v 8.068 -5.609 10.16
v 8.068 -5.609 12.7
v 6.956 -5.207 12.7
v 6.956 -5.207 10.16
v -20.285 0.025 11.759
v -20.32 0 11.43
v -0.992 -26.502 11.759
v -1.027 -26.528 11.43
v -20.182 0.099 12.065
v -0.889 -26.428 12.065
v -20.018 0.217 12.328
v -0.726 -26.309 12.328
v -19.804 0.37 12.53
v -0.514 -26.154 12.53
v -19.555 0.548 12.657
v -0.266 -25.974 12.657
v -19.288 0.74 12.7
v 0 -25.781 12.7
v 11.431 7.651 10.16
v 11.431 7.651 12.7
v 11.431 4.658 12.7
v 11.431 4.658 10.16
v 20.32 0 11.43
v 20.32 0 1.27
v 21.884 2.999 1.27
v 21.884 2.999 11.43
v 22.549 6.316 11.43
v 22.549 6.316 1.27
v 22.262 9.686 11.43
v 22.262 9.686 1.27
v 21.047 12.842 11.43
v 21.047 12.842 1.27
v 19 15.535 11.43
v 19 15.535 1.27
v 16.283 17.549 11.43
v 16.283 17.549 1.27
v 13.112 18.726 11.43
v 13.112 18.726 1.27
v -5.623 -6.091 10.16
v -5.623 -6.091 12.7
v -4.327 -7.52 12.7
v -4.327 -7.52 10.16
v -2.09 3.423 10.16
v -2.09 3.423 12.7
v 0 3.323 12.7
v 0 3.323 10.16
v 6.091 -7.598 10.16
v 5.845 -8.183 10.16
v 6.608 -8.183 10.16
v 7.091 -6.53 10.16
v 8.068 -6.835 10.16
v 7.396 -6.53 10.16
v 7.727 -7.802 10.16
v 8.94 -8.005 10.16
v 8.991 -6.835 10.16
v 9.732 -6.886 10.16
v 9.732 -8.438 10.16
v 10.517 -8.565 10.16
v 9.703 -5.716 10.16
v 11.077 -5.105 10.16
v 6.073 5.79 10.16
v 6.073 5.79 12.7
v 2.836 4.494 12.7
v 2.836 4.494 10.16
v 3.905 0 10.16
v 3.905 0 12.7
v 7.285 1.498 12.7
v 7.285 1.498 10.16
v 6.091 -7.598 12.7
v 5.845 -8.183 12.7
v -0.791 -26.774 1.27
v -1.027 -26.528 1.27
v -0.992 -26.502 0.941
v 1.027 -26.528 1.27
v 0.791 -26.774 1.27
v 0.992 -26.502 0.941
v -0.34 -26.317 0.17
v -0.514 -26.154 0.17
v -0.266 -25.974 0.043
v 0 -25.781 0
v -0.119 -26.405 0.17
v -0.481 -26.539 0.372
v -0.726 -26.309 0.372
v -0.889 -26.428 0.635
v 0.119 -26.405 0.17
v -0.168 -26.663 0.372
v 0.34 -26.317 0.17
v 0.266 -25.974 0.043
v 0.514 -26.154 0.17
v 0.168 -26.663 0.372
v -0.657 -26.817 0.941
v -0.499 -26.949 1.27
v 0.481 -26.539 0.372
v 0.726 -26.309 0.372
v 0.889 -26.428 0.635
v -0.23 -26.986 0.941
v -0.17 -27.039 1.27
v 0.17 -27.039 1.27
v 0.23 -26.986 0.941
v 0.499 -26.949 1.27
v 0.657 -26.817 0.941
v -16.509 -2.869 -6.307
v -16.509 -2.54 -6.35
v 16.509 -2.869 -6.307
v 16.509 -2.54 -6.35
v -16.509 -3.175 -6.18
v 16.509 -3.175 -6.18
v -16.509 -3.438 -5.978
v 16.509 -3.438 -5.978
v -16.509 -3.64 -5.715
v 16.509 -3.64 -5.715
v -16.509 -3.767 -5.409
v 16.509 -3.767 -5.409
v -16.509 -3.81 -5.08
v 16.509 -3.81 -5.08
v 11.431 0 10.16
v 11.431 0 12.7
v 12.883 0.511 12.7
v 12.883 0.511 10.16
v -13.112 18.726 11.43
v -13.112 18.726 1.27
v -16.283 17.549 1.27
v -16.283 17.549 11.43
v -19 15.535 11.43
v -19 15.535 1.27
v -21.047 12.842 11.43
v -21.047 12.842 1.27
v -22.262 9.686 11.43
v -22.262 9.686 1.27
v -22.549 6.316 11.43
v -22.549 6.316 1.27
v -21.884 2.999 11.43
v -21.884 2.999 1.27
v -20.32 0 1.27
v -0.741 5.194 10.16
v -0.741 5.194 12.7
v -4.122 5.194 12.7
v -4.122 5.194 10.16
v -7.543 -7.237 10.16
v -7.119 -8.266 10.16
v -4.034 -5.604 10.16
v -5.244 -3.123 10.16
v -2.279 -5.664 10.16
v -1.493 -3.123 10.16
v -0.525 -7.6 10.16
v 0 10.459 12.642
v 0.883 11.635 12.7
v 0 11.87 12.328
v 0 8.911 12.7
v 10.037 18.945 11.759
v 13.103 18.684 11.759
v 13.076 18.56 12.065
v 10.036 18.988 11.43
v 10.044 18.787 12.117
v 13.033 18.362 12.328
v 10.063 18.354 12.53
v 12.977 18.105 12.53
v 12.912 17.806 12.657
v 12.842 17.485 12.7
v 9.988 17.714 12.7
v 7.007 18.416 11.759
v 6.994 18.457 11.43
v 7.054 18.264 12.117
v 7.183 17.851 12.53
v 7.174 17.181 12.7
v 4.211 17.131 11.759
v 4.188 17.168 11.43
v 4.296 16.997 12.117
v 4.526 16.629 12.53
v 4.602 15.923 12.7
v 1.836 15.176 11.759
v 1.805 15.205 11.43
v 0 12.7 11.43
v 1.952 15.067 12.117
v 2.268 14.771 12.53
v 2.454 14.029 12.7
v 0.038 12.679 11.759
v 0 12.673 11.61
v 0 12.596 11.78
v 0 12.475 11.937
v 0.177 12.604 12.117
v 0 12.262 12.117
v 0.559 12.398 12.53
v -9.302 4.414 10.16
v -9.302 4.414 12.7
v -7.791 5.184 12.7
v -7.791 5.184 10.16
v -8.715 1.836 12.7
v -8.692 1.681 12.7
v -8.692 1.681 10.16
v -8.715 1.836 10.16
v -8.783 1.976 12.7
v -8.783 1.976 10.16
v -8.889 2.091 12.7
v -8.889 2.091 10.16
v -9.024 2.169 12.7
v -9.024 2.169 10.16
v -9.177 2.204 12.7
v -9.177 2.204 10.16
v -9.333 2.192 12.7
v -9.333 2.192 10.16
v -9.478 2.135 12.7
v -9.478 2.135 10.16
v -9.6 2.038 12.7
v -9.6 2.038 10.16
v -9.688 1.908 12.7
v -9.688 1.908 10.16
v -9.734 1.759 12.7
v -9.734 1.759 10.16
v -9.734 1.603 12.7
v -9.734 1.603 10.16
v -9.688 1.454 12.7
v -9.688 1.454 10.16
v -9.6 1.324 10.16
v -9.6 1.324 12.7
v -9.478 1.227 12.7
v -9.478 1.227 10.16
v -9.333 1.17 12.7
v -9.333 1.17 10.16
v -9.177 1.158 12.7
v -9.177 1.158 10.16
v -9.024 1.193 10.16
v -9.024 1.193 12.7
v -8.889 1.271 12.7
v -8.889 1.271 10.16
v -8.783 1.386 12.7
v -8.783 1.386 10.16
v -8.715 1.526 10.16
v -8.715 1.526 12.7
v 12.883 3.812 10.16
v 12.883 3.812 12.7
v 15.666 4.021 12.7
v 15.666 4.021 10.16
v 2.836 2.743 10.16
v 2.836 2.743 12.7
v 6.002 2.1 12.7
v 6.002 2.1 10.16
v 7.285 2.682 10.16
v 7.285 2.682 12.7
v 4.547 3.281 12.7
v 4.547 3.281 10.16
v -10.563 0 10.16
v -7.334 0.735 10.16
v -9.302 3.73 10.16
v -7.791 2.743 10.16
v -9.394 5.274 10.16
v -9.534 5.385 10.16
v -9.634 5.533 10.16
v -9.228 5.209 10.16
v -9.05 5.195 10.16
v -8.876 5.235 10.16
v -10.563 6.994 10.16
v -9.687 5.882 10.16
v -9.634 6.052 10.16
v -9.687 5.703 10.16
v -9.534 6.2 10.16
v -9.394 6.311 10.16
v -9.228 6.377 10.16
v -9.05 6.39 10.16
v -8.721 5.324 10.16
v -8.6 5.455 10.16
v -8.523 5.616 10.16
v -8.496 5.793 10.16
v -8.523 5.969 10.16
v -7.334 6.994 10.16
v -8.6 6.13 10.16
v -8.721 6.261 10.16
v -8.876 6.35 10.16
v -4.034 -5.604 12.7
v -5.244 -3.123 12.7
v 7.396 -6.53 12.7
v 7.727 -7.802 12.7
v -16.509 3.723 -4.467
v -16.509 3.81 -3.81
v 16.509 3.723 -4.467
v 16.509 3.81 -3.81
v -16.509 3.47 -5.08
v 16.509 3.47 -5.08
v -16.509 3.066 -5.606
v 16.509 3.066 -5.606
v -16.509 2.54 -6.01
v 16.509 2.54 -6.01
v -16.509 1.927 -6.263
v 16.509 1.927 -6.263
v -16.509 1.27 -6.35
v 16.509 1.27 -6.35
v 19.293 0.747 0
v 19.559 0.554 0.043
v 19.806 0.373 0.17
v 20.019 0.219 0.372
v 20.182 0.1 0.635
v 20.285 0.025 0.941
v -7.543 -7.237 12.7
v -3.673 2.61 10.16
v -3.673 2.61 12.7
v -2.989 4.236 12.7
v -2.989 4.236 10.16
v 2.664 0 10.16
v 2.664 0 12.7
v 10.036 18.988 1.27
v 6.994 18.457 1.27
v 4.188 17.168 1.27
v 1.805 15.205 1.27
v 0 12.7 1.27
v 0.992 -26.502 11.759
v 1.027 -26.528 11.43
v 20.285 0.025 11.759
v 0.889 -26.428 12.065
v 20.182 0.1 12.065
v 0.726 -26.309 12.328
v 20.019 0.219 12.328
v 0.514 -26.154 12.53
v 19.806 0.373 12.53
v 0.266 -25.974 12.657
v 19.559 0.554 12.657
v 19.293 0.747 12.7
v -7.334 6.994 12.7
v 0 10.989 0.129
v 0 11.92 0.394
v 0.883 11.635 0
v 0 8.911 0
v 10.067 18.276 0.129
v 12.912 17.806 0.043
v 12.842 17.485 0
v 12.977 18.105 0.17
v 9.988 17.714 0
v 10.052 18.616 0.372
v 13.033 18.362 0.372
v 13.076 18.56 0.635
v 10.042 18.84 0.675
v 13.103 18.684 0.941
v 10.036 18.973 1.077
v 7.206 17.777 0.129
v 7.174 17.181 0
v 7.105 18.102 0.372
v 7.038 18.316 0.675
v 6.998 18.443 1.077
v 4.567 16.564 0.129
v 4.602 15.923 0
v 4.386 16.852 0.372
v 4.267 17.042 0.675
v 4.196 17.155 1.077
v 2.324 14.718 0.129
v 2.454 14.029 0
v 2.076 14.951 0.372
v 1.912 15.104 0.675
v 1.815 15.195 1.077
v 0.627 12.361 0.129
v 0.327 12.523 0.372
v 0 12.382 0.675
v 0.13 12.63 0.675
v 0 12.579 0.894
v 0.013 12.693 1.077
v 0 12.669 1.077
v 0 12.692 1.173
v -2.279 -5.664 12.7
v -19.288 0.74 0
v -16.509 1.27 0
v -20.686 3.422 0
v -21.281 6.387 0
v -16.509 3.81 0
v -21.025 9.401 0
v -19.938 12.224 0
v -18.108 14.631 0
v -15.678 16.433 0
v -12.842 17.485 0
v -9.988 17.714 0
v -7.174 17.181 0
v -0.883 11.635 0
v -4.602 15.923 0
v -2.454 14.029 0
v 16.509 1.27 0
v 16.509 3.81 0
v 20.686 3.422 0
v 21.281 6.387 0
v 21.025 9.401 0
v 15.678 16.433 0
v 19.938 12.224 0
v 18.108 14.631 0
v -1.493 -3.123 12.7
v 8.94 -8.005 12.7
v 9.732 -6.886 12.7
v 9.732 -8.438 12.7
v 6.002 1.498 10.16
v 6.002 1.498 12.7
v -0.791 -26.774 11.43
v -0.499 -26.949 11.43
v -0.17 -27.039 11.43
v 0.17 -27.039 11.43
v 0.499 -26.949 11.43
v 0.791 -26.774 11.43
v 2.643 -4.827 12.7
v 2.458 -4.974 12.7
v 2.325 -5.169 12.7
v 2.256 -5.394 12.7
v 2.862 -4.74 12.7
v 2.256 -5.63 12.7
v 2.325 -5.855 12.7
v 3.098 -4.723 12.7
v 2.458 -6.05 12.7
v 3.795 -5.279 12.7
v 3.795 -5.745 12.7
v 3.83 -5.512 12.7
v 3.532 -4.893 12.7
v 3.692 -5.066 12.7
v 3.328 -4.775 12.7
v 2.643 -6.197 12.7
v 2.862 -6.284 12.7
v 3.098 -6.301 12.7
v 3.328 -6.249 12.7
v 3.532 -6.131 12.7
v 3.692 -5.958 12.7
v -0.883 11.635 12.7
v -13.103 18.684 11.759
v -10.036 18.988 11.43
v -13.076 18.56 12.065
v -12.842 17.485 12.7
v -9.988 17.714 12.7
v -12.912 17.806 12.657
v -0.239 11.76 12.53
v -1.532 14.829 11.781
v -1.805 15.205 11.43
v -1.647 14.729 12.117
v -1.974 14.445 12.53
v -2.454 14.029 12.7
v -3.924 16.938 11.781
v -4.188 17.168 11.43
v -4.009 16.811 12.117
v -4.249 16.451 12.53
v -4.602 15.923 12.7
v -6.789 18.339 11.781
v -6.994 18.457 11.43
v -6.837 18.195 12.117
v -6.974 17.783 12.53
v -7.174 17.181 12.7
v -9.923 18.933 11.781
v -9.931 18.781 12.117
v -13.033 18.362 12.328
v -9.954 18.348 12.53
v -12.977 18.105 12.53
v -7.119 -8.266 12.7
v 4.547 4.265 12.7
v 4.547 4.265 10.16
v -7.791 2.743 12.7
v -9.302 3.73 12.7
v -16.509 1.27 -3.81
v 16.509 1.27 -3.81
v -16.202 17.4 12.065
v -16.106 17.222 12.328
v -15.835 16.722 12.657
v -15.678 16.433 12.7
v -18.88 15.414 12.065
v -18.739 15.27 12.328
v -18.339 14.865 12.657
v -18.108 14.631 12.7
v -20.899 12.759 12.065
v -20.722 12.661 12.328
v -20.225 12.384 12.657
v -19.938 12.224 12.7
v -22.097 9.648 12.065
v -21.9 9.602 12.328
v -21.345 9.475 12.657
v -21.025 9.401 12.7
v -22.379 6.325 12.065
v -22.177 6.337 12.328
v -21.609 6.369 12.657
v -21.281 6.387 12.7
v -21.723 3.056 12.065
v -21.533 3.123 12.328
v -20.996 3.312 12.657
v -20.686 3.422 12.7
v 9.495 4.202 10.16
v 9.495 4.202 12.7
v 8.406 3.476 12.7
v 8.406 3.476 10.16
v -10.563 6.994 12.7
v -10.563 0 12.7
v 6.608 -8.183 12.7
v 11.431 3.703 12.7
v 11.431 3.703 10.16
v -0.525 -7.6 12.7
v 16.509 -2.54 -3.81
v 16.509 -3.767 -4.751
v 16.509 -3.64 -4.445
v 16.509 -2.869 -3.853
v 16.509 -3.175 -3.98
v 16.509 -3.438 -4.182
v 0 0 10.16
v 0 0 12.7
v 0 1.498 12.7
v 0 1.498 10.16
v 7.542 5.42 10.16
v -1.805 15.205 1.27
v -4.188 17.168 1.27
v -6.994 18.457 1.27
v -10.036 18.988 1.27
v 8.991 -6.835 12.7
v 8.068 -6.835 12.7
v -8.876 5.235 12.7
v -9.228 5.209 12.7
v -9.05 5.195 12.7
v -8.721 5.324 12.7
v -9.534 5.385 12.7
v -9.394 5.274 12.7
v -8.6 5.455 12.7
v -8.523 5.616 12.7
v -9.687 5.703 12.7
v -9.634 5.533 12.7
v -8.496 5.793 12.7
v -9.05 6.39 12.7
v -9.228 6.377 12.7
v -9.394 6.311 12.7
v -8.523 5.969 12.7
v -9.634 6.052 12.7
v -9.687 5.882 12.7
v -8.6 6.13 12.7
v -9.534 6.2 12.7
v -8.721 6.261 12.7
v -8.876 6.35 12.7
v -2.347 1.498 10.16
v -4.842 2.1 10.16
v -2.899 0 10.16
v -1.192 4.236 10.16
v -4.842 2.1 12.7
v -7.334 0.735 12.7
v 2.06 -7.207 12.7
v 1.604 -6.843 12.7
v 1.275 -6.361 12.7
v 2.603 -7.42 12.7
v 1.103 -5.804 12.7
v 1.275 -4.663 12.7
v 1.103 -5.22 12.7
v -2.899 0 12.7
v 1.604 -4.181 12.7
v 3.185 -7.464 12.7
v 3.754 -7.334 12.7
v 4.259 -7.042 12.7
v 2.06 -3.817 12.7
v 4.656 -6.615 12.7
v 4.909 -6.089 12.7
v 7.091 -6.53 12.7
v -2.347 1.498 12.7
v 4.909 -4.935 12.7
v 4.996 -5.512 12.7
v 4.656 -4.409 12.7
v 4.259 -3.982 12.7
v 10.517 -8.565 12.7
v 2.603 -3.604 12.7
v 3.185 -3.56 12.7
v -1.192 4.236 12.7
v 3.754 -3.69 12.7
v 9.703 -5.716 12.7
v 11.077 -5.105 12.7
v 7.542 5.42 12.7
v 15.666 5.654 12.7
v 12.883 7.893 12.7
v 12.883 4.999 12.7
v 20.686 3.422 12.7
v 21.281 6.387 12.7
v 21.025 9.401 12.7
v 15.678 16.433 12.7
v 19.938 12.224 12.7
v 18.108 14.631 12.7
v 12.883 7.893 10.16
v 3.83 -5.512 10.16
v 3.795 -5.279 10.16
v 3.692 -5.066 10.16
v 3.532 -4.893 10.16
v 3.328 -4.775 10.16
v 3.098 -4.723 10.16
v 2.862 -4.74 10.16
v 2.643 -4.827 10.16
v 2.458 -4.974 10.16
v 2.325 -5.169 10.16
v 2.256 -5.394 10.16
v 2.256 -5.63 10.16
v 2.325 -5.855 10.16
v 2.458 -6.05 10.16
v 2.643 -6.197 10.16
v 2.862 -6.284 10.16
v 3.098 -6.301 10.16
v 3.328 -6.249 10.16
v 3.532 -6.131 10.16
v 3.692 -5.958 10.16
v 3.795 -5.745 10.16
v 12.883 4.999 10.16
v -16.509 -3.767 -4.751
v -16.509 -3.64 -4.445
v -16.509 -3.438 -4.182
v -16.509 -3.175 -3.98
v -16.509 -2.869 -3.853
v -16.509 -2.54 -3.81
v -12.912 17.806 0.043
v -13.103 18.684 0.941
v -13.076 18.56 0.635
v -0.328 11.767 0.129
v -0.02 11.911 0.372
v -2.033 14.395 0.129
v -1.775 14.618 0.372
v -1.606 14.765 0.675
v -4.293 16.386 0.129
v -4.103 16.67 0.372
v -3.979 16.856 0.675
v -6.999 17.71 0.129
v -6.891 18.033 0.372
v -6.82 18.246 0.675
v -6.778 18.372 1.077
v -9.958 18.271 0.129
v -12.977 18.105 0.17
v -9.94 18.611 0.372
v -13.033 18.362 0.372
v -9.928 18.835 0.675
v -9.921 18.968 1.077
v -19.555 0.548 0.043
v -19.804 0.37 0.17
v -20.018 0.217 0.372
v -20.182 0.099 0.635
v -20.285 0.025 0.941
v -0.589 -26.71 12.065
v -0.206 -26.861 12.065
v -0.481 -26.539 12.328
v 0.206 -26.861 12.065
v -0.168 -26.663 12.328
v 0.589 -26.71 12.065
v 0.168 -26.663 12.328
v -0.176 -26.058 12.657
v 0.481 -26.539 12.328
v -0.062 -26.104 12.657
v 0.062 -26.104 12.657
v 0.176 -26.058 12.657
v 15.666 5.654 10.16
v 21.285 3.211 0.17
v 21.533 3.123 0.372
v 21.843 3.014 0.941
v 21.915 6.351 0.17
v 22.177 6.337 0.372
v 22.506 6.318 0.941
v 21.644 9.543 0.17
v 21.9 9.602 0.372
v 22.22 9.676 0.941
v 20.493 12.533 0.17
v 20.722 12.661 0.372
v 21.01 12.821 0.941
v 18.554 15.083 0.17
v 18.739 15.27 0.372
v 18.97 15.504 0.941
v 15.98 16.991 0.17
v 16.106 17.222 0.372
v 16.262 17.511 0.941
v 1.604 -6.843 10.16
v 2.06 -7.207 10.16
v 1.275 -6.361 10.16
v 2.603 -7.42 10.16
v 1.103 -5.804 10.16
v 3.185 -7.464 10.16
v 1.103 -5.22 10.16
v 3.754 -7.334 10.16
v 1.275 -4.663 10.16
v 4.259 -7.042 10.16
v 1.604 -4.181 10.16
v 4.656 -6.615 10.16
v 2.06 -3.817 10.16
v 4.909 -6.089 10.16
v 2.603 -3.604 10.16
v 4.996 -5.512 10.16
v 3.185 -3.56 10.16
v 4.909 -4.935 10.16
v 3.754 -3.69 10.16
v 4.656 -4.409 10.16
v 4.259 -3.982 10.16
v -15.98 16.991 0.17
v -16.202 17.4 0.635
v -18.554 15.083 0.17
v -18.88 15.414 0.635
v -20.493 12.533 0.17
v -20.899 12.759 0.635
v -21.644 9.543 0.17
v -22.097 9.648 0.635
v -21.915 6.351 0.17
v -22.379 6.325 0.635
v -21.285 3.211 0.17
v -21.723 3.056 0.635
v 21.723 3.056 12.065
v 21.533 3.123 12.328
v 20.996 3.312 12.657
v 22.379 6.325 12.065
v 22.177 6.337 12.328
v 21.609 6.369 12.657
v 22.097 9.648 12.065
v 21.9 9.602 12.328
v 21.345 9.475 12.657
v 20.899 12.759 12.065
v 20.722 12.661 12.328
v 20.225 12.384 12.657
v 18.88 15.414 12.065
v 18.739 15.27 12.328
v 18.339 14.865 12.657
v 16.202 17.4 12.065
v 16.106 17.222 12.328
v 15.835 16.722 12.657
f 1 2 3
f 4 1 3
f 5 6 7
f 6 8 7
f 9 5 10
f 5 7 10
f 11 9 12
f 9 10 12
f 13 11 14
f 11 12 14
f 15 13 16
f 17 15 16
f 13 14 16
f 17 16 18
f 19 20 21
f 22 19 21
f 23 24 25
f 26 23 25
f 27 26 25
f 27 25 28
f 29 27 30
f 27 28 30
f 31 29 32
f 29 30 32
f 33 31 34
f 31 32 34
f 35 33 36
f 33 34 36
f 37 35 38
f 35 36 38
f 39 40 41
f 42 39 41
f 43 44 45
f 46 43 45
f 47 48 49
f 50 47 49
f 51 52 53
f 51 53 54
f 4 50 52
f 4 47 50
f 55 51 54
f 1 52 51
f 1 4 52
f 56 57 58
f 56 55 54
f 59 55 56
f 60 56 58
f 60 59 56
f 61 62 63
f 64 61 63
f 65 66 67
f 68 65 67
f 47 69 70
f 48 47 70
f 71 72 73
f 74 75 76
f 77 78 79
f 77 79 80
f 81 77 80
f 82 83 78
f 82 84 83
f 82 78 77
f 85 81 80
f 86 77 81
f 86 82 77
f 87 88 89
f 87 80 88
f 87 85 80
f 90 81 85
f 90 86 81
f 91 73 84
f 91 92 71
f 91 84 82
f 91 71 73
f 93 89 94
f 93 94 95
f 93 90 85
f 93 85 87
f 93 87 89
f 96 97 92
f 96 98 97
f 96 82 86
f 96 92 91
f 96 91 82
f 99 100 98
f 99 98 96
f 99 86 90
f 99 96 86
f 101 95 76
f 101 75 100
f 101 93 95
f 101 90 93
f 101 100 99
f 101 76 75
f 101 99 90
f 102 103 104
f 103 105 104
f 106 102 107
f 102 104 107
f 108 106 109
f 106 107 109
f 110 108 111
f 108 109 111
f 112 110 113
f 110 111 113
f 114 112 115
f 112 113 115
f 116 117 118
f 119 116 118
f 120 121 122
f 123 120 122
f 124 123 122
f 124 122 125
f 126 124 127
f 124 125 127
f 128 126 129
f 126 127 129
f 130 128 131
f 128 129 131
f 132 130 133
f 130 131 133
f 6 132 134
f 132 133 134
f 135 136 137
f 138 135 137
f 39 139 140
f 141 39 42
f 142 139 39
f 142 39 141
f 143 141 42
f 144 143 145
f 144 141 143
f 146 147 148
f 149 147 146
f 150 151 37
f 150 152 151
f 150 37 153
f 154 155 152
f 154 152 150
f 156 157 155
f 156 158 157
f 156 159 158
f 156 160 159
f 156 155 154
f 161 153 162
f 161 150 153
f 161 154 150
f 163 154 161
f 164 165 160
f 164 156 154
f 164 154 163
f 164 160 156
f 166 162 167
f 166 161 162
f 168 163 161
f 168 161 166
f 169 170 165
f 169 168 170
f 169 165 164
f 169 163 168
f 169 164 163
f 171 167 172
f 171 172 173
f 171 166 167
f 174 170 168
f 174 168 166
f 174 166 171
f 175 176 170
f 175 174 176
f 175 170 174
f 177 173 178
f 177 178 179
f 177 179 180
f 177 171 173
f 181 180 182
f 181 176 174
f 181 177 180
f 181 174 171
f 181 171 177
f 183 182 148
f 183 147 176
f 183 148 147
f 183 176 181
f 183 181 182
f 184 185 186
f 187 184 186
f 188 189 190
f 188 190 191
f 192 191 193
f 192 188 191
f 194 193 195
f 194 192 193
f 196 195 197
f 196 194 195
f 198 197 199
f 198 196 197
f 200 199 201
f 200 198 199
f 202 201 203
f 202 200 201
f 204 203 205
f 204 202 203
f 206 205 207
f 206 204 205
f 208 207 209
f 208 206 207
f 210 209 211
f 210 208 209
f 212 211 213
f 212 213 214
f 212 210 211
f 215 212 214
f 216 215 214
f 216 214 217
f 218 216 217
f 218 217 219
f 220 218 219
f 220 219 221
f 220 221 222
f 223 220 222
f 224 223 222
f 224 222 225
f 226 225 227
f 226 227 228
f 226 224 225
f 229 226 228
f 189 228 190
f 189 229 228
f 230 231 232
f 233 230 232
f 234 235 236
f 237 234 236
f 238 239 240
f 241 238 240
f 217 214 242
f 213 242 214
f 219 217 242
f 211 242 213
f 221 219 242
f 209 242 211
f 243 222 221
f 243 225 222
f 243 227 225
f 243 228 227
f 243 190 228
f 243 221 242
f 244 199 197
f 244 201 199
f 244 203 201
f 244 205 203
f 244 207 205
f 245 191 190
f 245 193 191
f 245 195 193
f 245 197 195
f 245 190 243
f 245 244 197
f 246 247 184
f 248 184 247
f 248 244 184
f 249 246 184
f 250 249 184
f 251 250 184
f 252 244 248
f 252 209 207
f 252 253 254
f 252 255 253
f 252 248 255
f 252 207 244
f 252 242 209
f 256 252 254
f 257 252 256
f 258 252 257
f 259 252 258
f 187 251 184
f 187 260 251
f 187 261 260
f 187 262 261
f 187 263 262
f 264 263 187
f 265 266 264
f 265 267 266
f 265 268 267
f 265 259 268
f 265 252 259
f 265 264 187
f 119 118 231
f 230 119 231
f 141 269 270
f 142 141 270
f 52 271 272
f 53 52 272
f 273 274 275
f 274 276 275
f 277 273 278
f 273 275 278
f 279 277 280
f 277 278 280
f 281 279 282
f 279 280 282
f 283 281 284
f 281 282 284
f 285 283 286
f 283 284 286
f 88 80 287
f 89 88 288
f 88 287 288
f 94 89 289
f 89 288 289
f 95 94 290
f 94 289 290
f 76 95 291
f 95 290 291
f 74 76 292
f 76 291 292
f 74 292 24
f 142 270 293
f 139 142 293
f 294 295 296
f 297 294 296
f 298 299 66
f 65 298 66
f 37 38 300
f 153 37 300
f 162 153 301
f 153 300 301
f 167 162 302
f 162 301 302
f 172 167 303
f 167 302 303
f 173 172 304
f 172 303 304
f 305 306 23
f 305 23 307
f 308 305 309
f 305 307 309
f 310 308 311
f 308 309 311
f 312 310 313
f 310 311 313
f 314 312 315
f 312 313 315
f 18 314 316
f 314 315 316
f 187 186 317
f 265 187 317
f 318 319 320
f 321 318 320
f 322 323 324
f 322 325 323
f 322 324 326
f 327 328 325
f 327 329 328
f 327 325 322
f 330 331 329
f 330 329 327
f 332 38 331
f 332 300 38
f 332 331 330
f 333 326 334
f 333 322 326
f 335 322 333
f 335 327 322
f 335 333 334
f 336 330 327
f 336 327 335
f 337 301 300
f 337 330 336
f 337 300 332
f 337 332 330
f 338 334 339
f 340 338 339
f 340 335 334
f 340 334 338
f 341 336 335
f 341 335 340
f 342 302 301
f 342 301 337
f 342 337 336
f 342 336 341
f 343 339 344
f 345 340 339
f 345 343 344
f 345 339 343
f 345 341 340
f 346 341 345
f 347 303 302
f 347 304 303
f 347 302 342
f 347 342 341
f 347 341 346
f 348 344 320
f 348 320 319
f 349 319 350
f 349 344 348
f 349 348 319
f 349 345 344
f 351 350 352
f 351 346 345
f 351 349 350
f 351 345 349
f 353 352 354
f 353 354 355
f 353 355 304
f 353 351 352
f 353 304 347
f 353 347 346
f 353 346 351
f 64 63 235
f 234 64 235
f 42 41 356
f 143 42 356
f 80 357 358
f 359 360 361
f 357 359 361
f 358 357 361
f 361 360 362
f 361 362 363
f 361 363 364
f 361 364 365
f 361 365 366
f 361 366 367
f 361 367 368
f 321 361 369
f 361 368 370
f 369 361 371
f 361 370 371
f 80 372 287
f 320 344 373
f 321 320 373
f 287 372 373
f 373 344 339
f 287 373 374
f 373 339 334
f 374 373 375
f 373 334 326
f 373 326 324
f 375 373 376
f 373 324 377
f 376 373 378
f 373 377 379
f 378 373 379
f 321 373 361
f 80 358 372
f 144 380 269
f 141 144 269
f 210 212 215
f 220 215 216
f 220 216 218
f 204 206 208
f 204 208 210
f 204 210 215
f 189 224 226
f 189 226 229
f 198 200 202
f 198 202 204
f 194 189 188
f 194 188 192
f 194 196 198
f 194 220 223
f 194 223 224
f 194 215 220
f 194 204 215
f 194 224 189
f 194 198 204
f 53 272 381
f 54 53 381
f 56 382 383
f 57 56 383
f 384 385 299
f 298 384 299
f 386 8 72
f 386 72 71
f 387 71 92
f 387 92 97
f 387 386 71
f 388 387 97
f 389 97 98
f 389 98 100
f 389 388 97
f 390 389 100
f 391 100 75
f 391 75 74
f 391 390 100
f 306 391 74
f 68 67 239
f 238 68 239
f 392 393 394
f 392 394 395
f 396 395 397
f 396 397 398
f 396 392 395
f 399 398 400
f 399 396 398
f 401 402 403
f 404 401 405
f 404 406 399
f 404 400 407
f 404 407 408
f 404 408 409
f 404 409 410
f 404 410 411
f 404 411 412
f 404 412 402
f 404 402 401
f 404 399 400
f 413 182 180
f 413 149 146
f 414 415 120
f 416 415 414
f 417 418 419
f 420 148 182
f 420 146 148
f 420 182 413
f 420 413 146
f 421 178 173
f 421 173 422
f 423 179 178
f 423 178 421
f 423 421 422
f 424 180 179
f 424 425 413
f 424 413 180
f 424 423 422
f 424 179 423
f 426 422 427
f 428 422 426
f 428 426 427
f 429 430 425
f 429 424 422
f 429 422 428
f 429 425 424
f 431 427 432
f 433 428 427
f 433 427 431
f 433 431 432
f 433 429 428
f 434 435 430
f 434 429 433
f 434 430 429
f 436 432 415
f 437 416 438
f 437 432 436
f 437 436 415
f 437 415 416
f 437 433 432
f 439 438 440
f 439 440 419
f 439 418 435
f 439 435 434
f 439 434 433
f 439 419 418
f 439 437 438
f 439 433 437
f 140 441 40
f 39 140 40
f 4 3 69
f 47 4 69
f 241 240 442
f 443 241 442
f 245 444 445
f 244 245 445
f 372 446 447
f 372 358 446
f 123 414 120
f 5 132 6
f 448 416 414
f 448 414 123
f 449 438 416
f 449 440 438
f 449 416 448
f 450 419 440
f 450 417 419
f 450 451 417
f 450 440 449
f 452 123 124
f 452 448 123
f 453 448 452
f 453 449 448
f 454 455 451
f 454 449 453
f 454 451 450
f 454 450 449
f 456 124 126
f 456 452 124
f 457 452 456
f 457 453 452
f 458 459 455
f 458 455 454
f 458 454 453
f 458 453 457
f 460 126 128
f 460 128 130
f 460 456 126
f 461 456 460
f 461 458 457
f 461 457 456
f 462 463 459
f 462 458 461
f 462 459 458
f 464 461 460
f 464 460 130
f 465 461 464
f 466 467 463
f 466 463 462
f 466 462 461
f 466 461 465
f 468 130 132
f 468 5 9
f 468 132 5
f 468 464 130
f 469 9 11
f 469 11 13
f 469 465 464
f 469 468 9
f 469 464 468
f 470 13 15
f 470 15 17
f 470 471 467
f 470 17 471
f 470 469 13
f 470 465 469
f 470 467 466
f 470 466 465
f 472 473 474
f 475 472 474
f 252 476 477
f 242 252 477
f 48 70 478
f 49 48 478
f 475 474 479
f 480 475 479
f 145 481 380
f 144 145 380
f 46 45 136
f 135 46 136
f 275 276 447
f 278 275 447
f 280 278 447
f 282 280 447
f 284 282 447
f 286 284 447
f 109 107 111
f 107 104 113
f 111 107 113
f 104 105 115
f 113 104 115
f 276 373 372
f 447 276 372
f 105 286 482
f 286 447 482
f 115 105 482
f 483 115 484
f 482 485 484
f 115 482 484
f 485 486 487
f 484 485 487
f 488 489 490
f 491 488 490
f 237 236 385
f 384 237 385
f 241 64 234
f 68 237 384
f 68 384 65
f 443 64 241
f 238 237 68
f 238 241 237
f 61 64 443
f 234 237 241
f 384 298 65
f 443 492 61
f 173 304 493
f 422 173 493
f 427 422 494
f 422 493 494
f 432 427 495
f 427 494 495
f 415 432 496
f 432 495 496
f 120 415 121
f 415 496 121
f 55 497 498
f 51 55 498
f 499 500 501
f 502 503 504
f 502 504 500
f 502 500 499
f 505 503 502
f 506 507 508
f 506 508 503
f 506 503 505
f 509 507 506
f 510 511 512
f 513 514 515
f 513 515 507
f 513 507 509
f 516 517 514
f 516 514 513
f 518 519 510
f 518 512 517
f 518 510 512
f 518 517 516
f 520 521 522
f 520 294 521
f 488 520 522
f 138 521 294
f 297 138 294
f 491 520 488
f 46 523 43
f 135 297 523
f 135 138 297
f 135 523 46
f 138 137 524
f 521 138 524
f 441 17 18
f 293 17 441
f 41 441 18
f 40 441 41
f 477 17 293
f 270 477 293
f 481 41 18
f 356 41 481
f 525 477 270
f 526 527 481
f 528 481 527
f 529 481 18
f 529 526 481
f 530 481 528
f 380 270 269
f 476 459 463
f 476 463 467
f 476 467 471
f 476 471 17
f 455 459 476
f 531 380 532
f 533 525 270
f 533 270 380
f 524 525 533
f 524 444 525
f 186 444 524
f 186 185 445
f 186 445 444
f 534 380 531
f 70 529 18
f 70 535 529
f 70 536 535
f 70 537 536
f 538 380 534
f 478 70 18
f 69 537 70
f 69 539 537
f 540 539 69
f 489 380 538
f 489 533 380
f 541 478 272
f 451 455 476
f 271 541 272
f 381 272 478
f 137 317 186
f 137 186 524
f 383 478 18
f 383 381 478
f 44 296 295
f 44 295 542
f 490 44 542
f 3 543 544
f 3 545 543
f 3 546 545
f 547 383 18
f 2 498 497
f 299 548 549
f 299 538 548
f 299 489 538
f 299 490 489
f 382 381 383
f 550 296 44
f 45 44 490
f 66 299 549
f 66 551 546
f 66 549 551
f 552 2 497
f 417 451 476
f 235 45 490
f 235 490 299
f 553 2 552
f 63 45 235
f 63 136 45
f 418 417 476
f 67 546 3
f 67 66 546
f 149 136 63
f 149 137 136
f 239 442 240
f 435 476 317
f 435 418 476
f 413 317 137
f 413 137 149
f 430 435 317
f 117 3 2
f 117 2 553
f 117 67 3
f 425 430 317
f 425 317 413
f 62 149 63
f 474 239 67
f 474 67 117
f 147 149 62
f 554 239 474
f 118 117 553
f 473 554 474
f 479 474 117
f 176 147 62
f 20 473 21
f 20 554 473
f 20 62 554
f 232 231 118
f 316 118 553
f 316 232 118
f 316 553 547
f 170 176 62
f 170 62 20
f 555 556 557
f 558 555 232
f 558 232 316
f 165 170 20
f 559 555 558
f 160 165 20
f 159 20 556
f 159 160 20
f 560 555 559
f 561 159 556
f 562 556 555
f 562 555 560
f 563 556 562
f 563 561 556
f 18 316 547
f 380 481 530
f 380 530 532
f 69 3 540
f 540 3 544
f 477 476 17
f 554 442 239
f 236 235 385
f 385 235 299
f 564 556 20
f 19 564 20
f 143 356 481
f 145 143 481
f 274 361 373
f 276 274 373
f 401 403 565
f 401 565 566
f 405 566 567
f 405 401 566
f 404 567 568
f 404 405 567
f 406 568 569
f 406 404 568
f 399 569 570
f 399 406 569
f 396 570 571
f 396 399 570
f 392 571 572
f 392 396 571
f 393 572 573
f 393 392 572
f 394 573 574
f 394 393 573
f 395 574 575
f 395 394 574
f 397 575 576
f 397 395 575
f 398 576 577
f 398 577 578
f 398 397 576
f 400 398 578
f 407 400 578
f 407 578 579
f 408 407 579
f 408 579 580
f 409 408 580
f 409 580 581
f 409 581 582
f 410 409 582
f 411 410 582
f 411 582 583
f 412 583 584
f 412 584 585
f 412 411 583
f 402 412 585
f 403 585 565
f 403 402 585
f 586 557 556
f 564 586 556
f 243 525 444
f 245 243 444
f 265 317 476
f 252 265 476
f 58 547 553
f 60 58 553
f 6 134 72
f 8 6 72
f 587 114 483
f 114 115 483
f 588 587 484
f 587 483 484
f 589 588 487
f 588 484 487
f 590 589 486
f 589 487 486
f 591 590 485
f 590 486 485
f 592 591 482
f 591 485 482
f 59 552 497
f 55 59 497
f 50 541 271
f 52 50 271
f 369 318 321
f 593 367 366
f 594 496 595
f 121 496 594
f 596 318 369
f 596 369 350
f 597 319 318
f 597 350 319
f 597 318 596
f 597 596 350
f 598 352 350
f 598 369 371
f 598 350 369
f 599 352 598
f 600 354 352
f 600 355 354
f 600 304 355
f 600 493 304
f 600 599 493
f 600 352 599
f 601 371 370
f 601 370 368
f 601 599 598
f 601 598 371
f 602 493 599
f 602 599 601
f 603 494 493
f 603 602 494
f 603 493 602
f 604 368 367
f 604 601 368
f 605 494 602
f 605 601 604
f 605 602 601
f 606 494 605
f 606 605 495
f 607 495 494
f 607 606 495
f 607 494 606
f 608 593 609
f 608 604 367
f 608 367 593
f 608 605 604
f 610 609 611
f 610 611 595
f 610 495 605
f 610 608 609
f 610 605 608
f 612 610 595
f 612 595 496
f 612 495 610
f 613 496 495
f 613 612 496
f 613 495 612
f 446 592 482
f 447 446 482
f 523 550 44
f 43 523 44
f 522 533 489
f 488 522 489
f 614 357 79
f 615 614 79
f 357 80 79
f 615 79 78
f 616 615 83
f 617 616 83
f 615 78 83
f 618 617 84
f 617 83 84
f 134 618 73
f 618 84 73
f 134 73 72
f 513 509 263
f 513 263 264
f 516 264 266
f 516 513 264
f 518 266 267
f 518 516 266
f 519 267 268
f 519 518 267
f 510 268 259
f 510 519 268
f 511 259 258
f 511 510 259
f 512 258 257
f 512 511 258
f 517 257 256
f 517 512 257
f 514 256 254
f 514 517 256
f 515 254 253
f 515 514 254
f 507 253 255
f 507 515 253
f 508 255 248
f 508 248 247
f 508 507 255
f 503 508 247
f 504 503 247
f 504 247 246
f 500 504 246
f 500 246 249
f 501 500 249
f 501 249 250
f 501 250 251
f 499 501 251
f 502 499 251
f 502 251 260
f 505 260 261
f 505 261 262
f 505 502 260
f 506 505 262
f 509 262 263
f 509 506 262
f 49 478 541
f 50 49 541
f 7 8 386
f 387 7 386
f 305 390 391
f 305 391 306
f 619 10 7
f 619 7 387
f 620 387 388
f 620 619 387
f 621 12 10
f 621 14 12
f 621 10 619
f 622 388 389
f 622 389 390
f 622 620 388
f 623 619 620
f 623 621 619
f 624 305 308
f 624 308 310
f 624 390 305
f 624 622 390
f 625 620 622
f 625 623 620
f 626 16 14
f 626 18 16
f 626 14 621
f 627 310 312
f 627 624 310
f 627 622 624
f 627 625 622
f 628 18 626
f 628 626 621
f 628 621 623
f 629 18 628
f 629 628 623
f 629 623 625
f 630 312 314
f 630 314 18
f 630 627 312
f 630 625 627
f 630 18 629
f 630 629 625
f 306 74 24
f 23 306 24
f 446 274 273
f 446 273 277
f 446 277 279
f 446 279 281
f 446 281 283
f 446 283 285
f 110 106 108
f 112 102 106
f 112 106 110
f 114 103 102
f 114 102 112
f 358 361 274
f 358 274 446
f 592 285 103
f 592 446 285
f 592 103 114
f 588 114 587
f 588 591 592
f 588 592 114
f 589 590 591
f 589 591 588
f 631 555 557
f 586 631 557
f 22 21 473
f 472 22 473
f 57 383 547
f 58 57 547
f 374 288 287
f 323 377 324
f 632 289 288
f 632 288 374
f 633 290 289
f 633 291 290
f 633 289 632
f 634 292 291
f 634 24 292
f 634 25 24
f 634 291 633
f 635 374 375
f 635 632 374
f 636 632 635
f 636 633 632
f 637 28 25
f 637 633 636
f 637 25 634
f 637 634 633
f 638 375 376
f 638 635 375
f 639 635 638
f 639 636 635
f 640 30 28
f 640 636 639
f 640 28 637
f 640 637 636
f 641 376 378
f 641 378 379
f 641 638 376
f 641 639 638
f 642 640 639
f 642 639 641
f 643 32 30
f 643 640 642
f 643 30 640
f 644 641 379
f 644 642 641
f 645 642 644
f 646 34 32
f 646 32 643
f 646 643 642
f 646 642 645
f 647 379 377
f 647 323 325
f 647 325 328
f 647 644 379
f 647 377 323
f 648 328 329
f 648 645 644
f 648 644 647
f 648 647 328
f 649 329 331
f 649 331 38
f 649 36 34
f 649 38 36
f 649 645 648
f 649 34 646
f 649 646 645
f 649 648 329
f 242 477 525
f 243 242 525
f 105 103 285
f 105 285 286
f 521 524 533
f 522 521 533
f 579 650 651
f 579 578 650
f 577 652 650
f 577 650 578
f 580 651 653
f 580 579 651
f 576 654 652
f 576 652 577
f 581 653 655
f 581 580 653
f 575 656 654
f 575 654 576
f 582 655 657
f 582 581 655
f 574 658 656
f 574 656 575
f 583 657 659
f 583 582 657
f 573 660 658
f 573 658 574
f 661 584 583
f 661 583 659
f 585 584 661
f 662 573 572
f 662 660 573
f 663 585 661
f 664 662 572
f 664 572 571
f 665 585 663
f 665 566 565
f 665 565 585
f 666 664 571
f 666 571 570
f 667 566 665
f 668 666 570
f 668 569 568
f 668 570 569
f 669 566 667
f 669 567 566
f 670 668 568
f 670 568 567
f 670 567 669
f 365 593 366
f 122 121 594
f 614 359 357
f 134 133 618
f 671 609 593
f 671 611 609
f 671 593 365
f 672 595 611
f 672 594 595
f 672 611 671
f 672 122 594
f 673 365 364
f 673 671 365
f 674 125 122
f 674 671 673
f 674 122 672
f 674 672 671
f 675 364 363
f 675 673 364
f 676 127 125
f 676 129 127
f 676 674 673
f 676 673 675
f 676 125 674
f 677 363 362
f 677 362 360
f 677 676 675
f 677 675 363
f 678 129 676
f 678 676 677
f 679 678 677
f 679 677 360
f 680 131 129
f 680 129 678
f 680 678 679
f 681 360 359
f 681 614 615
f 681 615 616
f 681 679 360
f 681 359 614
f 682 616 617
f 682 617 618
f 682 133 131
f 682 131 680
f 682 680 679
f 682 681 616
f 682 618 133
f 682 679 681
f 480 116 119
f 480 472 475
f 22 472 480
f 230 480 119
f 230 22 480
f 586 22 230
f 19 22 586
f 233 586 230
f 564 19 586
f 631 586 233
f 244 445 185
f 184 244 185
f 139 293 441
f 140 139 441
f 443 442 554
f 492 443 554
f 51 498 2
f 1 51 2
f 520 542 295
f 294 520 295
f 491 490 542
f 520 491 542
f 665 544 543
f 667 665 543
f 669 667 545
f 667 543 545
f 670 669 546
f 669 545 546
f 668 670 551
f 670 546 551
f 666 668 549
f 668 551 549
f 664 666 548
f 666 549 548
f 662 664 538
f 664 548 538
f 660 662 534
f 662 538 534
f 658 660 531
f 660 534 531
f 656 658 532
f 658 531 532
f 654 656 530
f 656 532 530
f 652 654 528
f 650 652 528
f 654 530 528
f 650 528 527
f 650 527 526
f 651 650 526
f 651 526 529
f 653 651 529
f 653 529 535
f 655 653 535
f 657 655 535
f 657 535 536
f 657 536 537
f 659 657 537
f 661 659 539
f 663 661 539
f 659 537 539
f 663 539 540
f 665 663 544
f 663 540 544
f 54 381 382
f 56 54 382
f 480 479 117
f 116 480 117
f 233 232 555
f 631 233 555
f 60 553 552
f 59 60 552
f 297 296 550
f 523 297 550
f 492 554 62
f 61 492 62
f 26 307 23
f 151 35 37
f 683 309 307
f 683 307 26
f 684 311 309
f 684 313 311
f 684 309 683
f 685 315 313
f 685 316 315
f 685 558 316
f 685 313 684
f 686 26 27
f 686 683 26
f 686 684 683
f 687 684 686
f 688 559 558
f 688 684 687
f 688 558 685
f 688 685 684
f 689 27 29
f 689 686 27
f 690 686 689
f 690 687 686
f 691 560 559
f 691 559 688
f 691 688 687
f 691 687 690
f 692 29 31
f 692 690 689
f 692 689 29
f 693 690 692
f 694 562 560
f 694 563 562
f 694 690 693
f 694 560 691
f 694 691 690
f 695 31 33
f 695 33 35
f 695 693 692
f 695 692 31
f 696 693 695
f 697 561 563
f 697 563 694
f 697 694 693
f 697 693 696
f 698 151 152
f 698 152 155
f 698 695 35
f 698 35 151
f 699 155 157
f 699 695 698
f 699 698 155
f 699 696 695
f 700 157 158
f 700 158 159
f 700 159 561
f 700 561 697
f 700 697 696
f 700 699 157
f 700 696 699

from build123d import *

# Parameters (mm, degrees)
F1_DEPTH  = 12.7
F2_R      = 1.27
F3_W      = 33.0184467606
F3_H      = 7.62
F4_DEPTH  = 6.35
F6_DEPTH  = 5.08
F7_R      = 2.54
F8_R      = 1.26999
F10_R     = 0.5243142603
F10_R_2   = 0.598941464
F10_R_3   = 1.9572905624
F10_R_4   = 0.79146579
F11_DEPTH = 2.54


# Not quite as in the source:
# - a fillet or chamfer is up to 0.001 mm smaller than in the source, because OpenCascade refuses the exact size
# - a feature of the source that left no trace in its solid (it failed there, or was rolled back) is left out


with BuildPart() as f1:
    # F0 (on Top) → F1 (new body)
    with BuildSketch(Plane.XY):
        Polygon((0, -27.94), (0, 0), (-20.32, 0), align=None)
        with BuildLine():
            Line((-20.32, 0), (0, 0))
            Line((0, 0), (-13.111957335, 18.7258157324))
            ThreePointArc((-13.111957335, 18.7258157324), (-21.7665907667, 11.3070168981), (-20.32, 0))
        make_face()
        with BuildLine():
            Line((0, 0), (0, 12.7))
            ThreePointArc((0, 12.7), (-5.5495799526, 17.902795111), (-13.111957335, 18.7258157324))
            Line((-13.111957335, 18.7258157324), (0, 0))
        make_face()
        with BuildLine():
            ThreePointArc((13.111957335, 18.7258157324), (5.5495799526, 17.902795111), (0, 12.7))
            Line((0, 12.7), (0, 0))
            Line((0, 0), (13.111957335, 18.7258157324))
        make_face()
        with BuildLine():
            Line((13.111957335, 18.7258157324), (0, 0))
            Line((0, 0), (20.32, 0))
            ThreePointArc((20.32, 0), (21.7665907667, 11.3070168981), (13.111957335, 18.7258157324))
        make_face()
        Polygon((20.32, 0), (0, 0), (0, -27.94), align=None)
    extrude(amount=F1_DEPTH)

    # F2
    f2_edges = [f1.edges().sort_by_distance(p)[0] for p in [
        (0, -27.94, 6.35),
    ]]
    fillet(f2_edges, radius=F2_R)

    # F3 (on face) → F4 (join)
    with BuildSketch(Plane(origin=(0, 0, 0), x_dir=(1, 0, 0), z_dir=(0, 0, -1))):
        Rectangle(F3_W, F3_H)
    extrude(amount=F4_DEPTH)

    # F5 (on face) → F6 (cut)
    with BuildSketch(Plane.XZ.offset(3.81)):
        Polygon((-16.5092233803, -3.81), (0, -3.81), (16.5092233803, -3.81), (16.5092233803, 0), (-16.5092233803, 0), align=None)
    extrude(amount=-F6_DEPTH, mode=Mode.SUBTRACT)

    # F7
    f7_edges = [f1.edges().sort_by_distance(p)[0] for p in [
        (0, 3.81, -6.35),
    ]]
    fillet(f7_edges, radius=F7_R)

    # F8 (radius 1.27 in the source; OpenCascade refuses exactly that, so slightly less here)
    f8_edges = [f1.edges().sort_by_distance(p)[0] for p in [
        (0, -3.81, -3.81),
        (0, -3.81, -6.35),
        (-10.673547, -13.263872, 12.7),
        (10.673547, -13.263872, 0),
    ]]
    fillet(f8_edges, radius=F8_R)

    # F10 (on face) → F11 (cut)
    with BuildSketch(Plane.XY.offset(12.7)):
        Polygon((-7.3335906491, 6.9943653395), (-10.5627283372, 6.9943653395), (-10.5627283372, 0), (-7.3335906491, 0.7349486114), (-7.79060311, 2.7429205143), (-9.3015888706, 3.7297289819), (-9.3015888706, 4.4142501429), (-7.79060311, 5.1843370311), align=None)
        with Locations((-9.2159248888, 1.6810059315)):
            Circle(F10_R, mode=Mode.SUBTRACT)
        with Locations((-9.0948464349, 5.7926201262)):
            Circle(F10_R_2, mode=Mode.SUBTRACT)
        Polygon((-5.2438098937, -3.1229529995), (-7.5429510325, -7.2372052819), (-7.1194251068, -8.2657681778), (-5.6228582704, -6.0908141027), (-4.3273653508, -7.5203236143), (-2.2791281808, -5.6641087867), (-0.5245208158, -7.6002273709), (-1.4925802825, -3.1229529995), (-4.0337359533, -5.60360495), align=None)
        Polygon((-2.0902381511, 3.4230099991), (0, 3.3229410183), (-0.7406336372, 5.1936786622), (-4.1223512962, 5.1936786622), (-4.841865506, 2.0997666288), (-2.8991762083, 0), (0, 0), (0, 1.4977937099), (-2.3469333537, 1.4977937099), (-3.6731935106, 2.6101409458), (-2.9886723496, 4.2358790524), (-1.1918039527, 4.2358790524), align=None)
        Polygon((7.5416904874, 5.4201777093), (6.0734692961, 5.7895942591), (2.8356553521, 4.4944682159), (2.8356553521, 2.7429205143), (6.001518108, 2.0997666288), (6.001518108, 1.4977937099), (2.6644766331, 0), (3.9051719941, 0), (7.2849951684, 1.4977937099), (7.2849951684, 2.6820923667), (4.5469105244, 3.281048499), (4.5469105244, 4.2650480755), align=None)
        Polygon((12.8831379116, 3.8117669891), (11.4310486242, 3.702860409), (11.4310486242, 0), (12.8831379116, 0.5112900399), align=None)
        Polygon((11.4310486242, 3.702860409), (11.4310486242, 4.6575730793), (9.4949305058, 4.2020159308), (8.4058633074, 3.4759717528), align=None)
        Polygon((12.8831379116, 7.8927418217), (11.4310486242, 7.6507278718), (11.4310486242, 4.6575730793), (12.8831379116, 4.999241105), align=None)
        Polygon((15.6663097441, 5.6541049853), (12.8831379116, 4.999241105), (12.8831379116, 3.8117669891), (15.6663097441, 4.0205046535), align=None)
        Polygon((12.8831379116, 4.999241105), (11.4310486242, 4.6575730793), (11.4310486242, 3.702860409), (12.8831379116, 3.8117669891), align=None)
        Polygon((6.9560511038, -5.2067907527), (6.0911364853, -7.59802619), (5.8446256444, -8.1831160933), (6.6077862866, -8.1831160933), (7.0911212824, -6.5296017565), (7.3963850737, -6.5296017565), (7.727087941, -7.801536005), (8.9402683079, -8.0050453544), (9.7322071764, -6.8857432343), (9.7322071764, -8.4376684573), (10.517465882, -8.5646957159), (11.0771171749, -5.1050363109), (9.7034284845, -5.7155638933), (8.9911455289, -6.8348660134), (8.0683877672, -6.8348660134), (8.0683877672, -5.6091251385), align=None)
        with Locations((3.0384953134, -5.5120550096)):
            Circle(F10_R_3)
        with Locations((3.0384953134, -5.5120550096)):
            Circle(F10_R_4, mode=Mode.SUBTRACT)
    extrude(amount=-F11_DEPTH, mode=Mode.SUBTRACT)


solid = f1.part
